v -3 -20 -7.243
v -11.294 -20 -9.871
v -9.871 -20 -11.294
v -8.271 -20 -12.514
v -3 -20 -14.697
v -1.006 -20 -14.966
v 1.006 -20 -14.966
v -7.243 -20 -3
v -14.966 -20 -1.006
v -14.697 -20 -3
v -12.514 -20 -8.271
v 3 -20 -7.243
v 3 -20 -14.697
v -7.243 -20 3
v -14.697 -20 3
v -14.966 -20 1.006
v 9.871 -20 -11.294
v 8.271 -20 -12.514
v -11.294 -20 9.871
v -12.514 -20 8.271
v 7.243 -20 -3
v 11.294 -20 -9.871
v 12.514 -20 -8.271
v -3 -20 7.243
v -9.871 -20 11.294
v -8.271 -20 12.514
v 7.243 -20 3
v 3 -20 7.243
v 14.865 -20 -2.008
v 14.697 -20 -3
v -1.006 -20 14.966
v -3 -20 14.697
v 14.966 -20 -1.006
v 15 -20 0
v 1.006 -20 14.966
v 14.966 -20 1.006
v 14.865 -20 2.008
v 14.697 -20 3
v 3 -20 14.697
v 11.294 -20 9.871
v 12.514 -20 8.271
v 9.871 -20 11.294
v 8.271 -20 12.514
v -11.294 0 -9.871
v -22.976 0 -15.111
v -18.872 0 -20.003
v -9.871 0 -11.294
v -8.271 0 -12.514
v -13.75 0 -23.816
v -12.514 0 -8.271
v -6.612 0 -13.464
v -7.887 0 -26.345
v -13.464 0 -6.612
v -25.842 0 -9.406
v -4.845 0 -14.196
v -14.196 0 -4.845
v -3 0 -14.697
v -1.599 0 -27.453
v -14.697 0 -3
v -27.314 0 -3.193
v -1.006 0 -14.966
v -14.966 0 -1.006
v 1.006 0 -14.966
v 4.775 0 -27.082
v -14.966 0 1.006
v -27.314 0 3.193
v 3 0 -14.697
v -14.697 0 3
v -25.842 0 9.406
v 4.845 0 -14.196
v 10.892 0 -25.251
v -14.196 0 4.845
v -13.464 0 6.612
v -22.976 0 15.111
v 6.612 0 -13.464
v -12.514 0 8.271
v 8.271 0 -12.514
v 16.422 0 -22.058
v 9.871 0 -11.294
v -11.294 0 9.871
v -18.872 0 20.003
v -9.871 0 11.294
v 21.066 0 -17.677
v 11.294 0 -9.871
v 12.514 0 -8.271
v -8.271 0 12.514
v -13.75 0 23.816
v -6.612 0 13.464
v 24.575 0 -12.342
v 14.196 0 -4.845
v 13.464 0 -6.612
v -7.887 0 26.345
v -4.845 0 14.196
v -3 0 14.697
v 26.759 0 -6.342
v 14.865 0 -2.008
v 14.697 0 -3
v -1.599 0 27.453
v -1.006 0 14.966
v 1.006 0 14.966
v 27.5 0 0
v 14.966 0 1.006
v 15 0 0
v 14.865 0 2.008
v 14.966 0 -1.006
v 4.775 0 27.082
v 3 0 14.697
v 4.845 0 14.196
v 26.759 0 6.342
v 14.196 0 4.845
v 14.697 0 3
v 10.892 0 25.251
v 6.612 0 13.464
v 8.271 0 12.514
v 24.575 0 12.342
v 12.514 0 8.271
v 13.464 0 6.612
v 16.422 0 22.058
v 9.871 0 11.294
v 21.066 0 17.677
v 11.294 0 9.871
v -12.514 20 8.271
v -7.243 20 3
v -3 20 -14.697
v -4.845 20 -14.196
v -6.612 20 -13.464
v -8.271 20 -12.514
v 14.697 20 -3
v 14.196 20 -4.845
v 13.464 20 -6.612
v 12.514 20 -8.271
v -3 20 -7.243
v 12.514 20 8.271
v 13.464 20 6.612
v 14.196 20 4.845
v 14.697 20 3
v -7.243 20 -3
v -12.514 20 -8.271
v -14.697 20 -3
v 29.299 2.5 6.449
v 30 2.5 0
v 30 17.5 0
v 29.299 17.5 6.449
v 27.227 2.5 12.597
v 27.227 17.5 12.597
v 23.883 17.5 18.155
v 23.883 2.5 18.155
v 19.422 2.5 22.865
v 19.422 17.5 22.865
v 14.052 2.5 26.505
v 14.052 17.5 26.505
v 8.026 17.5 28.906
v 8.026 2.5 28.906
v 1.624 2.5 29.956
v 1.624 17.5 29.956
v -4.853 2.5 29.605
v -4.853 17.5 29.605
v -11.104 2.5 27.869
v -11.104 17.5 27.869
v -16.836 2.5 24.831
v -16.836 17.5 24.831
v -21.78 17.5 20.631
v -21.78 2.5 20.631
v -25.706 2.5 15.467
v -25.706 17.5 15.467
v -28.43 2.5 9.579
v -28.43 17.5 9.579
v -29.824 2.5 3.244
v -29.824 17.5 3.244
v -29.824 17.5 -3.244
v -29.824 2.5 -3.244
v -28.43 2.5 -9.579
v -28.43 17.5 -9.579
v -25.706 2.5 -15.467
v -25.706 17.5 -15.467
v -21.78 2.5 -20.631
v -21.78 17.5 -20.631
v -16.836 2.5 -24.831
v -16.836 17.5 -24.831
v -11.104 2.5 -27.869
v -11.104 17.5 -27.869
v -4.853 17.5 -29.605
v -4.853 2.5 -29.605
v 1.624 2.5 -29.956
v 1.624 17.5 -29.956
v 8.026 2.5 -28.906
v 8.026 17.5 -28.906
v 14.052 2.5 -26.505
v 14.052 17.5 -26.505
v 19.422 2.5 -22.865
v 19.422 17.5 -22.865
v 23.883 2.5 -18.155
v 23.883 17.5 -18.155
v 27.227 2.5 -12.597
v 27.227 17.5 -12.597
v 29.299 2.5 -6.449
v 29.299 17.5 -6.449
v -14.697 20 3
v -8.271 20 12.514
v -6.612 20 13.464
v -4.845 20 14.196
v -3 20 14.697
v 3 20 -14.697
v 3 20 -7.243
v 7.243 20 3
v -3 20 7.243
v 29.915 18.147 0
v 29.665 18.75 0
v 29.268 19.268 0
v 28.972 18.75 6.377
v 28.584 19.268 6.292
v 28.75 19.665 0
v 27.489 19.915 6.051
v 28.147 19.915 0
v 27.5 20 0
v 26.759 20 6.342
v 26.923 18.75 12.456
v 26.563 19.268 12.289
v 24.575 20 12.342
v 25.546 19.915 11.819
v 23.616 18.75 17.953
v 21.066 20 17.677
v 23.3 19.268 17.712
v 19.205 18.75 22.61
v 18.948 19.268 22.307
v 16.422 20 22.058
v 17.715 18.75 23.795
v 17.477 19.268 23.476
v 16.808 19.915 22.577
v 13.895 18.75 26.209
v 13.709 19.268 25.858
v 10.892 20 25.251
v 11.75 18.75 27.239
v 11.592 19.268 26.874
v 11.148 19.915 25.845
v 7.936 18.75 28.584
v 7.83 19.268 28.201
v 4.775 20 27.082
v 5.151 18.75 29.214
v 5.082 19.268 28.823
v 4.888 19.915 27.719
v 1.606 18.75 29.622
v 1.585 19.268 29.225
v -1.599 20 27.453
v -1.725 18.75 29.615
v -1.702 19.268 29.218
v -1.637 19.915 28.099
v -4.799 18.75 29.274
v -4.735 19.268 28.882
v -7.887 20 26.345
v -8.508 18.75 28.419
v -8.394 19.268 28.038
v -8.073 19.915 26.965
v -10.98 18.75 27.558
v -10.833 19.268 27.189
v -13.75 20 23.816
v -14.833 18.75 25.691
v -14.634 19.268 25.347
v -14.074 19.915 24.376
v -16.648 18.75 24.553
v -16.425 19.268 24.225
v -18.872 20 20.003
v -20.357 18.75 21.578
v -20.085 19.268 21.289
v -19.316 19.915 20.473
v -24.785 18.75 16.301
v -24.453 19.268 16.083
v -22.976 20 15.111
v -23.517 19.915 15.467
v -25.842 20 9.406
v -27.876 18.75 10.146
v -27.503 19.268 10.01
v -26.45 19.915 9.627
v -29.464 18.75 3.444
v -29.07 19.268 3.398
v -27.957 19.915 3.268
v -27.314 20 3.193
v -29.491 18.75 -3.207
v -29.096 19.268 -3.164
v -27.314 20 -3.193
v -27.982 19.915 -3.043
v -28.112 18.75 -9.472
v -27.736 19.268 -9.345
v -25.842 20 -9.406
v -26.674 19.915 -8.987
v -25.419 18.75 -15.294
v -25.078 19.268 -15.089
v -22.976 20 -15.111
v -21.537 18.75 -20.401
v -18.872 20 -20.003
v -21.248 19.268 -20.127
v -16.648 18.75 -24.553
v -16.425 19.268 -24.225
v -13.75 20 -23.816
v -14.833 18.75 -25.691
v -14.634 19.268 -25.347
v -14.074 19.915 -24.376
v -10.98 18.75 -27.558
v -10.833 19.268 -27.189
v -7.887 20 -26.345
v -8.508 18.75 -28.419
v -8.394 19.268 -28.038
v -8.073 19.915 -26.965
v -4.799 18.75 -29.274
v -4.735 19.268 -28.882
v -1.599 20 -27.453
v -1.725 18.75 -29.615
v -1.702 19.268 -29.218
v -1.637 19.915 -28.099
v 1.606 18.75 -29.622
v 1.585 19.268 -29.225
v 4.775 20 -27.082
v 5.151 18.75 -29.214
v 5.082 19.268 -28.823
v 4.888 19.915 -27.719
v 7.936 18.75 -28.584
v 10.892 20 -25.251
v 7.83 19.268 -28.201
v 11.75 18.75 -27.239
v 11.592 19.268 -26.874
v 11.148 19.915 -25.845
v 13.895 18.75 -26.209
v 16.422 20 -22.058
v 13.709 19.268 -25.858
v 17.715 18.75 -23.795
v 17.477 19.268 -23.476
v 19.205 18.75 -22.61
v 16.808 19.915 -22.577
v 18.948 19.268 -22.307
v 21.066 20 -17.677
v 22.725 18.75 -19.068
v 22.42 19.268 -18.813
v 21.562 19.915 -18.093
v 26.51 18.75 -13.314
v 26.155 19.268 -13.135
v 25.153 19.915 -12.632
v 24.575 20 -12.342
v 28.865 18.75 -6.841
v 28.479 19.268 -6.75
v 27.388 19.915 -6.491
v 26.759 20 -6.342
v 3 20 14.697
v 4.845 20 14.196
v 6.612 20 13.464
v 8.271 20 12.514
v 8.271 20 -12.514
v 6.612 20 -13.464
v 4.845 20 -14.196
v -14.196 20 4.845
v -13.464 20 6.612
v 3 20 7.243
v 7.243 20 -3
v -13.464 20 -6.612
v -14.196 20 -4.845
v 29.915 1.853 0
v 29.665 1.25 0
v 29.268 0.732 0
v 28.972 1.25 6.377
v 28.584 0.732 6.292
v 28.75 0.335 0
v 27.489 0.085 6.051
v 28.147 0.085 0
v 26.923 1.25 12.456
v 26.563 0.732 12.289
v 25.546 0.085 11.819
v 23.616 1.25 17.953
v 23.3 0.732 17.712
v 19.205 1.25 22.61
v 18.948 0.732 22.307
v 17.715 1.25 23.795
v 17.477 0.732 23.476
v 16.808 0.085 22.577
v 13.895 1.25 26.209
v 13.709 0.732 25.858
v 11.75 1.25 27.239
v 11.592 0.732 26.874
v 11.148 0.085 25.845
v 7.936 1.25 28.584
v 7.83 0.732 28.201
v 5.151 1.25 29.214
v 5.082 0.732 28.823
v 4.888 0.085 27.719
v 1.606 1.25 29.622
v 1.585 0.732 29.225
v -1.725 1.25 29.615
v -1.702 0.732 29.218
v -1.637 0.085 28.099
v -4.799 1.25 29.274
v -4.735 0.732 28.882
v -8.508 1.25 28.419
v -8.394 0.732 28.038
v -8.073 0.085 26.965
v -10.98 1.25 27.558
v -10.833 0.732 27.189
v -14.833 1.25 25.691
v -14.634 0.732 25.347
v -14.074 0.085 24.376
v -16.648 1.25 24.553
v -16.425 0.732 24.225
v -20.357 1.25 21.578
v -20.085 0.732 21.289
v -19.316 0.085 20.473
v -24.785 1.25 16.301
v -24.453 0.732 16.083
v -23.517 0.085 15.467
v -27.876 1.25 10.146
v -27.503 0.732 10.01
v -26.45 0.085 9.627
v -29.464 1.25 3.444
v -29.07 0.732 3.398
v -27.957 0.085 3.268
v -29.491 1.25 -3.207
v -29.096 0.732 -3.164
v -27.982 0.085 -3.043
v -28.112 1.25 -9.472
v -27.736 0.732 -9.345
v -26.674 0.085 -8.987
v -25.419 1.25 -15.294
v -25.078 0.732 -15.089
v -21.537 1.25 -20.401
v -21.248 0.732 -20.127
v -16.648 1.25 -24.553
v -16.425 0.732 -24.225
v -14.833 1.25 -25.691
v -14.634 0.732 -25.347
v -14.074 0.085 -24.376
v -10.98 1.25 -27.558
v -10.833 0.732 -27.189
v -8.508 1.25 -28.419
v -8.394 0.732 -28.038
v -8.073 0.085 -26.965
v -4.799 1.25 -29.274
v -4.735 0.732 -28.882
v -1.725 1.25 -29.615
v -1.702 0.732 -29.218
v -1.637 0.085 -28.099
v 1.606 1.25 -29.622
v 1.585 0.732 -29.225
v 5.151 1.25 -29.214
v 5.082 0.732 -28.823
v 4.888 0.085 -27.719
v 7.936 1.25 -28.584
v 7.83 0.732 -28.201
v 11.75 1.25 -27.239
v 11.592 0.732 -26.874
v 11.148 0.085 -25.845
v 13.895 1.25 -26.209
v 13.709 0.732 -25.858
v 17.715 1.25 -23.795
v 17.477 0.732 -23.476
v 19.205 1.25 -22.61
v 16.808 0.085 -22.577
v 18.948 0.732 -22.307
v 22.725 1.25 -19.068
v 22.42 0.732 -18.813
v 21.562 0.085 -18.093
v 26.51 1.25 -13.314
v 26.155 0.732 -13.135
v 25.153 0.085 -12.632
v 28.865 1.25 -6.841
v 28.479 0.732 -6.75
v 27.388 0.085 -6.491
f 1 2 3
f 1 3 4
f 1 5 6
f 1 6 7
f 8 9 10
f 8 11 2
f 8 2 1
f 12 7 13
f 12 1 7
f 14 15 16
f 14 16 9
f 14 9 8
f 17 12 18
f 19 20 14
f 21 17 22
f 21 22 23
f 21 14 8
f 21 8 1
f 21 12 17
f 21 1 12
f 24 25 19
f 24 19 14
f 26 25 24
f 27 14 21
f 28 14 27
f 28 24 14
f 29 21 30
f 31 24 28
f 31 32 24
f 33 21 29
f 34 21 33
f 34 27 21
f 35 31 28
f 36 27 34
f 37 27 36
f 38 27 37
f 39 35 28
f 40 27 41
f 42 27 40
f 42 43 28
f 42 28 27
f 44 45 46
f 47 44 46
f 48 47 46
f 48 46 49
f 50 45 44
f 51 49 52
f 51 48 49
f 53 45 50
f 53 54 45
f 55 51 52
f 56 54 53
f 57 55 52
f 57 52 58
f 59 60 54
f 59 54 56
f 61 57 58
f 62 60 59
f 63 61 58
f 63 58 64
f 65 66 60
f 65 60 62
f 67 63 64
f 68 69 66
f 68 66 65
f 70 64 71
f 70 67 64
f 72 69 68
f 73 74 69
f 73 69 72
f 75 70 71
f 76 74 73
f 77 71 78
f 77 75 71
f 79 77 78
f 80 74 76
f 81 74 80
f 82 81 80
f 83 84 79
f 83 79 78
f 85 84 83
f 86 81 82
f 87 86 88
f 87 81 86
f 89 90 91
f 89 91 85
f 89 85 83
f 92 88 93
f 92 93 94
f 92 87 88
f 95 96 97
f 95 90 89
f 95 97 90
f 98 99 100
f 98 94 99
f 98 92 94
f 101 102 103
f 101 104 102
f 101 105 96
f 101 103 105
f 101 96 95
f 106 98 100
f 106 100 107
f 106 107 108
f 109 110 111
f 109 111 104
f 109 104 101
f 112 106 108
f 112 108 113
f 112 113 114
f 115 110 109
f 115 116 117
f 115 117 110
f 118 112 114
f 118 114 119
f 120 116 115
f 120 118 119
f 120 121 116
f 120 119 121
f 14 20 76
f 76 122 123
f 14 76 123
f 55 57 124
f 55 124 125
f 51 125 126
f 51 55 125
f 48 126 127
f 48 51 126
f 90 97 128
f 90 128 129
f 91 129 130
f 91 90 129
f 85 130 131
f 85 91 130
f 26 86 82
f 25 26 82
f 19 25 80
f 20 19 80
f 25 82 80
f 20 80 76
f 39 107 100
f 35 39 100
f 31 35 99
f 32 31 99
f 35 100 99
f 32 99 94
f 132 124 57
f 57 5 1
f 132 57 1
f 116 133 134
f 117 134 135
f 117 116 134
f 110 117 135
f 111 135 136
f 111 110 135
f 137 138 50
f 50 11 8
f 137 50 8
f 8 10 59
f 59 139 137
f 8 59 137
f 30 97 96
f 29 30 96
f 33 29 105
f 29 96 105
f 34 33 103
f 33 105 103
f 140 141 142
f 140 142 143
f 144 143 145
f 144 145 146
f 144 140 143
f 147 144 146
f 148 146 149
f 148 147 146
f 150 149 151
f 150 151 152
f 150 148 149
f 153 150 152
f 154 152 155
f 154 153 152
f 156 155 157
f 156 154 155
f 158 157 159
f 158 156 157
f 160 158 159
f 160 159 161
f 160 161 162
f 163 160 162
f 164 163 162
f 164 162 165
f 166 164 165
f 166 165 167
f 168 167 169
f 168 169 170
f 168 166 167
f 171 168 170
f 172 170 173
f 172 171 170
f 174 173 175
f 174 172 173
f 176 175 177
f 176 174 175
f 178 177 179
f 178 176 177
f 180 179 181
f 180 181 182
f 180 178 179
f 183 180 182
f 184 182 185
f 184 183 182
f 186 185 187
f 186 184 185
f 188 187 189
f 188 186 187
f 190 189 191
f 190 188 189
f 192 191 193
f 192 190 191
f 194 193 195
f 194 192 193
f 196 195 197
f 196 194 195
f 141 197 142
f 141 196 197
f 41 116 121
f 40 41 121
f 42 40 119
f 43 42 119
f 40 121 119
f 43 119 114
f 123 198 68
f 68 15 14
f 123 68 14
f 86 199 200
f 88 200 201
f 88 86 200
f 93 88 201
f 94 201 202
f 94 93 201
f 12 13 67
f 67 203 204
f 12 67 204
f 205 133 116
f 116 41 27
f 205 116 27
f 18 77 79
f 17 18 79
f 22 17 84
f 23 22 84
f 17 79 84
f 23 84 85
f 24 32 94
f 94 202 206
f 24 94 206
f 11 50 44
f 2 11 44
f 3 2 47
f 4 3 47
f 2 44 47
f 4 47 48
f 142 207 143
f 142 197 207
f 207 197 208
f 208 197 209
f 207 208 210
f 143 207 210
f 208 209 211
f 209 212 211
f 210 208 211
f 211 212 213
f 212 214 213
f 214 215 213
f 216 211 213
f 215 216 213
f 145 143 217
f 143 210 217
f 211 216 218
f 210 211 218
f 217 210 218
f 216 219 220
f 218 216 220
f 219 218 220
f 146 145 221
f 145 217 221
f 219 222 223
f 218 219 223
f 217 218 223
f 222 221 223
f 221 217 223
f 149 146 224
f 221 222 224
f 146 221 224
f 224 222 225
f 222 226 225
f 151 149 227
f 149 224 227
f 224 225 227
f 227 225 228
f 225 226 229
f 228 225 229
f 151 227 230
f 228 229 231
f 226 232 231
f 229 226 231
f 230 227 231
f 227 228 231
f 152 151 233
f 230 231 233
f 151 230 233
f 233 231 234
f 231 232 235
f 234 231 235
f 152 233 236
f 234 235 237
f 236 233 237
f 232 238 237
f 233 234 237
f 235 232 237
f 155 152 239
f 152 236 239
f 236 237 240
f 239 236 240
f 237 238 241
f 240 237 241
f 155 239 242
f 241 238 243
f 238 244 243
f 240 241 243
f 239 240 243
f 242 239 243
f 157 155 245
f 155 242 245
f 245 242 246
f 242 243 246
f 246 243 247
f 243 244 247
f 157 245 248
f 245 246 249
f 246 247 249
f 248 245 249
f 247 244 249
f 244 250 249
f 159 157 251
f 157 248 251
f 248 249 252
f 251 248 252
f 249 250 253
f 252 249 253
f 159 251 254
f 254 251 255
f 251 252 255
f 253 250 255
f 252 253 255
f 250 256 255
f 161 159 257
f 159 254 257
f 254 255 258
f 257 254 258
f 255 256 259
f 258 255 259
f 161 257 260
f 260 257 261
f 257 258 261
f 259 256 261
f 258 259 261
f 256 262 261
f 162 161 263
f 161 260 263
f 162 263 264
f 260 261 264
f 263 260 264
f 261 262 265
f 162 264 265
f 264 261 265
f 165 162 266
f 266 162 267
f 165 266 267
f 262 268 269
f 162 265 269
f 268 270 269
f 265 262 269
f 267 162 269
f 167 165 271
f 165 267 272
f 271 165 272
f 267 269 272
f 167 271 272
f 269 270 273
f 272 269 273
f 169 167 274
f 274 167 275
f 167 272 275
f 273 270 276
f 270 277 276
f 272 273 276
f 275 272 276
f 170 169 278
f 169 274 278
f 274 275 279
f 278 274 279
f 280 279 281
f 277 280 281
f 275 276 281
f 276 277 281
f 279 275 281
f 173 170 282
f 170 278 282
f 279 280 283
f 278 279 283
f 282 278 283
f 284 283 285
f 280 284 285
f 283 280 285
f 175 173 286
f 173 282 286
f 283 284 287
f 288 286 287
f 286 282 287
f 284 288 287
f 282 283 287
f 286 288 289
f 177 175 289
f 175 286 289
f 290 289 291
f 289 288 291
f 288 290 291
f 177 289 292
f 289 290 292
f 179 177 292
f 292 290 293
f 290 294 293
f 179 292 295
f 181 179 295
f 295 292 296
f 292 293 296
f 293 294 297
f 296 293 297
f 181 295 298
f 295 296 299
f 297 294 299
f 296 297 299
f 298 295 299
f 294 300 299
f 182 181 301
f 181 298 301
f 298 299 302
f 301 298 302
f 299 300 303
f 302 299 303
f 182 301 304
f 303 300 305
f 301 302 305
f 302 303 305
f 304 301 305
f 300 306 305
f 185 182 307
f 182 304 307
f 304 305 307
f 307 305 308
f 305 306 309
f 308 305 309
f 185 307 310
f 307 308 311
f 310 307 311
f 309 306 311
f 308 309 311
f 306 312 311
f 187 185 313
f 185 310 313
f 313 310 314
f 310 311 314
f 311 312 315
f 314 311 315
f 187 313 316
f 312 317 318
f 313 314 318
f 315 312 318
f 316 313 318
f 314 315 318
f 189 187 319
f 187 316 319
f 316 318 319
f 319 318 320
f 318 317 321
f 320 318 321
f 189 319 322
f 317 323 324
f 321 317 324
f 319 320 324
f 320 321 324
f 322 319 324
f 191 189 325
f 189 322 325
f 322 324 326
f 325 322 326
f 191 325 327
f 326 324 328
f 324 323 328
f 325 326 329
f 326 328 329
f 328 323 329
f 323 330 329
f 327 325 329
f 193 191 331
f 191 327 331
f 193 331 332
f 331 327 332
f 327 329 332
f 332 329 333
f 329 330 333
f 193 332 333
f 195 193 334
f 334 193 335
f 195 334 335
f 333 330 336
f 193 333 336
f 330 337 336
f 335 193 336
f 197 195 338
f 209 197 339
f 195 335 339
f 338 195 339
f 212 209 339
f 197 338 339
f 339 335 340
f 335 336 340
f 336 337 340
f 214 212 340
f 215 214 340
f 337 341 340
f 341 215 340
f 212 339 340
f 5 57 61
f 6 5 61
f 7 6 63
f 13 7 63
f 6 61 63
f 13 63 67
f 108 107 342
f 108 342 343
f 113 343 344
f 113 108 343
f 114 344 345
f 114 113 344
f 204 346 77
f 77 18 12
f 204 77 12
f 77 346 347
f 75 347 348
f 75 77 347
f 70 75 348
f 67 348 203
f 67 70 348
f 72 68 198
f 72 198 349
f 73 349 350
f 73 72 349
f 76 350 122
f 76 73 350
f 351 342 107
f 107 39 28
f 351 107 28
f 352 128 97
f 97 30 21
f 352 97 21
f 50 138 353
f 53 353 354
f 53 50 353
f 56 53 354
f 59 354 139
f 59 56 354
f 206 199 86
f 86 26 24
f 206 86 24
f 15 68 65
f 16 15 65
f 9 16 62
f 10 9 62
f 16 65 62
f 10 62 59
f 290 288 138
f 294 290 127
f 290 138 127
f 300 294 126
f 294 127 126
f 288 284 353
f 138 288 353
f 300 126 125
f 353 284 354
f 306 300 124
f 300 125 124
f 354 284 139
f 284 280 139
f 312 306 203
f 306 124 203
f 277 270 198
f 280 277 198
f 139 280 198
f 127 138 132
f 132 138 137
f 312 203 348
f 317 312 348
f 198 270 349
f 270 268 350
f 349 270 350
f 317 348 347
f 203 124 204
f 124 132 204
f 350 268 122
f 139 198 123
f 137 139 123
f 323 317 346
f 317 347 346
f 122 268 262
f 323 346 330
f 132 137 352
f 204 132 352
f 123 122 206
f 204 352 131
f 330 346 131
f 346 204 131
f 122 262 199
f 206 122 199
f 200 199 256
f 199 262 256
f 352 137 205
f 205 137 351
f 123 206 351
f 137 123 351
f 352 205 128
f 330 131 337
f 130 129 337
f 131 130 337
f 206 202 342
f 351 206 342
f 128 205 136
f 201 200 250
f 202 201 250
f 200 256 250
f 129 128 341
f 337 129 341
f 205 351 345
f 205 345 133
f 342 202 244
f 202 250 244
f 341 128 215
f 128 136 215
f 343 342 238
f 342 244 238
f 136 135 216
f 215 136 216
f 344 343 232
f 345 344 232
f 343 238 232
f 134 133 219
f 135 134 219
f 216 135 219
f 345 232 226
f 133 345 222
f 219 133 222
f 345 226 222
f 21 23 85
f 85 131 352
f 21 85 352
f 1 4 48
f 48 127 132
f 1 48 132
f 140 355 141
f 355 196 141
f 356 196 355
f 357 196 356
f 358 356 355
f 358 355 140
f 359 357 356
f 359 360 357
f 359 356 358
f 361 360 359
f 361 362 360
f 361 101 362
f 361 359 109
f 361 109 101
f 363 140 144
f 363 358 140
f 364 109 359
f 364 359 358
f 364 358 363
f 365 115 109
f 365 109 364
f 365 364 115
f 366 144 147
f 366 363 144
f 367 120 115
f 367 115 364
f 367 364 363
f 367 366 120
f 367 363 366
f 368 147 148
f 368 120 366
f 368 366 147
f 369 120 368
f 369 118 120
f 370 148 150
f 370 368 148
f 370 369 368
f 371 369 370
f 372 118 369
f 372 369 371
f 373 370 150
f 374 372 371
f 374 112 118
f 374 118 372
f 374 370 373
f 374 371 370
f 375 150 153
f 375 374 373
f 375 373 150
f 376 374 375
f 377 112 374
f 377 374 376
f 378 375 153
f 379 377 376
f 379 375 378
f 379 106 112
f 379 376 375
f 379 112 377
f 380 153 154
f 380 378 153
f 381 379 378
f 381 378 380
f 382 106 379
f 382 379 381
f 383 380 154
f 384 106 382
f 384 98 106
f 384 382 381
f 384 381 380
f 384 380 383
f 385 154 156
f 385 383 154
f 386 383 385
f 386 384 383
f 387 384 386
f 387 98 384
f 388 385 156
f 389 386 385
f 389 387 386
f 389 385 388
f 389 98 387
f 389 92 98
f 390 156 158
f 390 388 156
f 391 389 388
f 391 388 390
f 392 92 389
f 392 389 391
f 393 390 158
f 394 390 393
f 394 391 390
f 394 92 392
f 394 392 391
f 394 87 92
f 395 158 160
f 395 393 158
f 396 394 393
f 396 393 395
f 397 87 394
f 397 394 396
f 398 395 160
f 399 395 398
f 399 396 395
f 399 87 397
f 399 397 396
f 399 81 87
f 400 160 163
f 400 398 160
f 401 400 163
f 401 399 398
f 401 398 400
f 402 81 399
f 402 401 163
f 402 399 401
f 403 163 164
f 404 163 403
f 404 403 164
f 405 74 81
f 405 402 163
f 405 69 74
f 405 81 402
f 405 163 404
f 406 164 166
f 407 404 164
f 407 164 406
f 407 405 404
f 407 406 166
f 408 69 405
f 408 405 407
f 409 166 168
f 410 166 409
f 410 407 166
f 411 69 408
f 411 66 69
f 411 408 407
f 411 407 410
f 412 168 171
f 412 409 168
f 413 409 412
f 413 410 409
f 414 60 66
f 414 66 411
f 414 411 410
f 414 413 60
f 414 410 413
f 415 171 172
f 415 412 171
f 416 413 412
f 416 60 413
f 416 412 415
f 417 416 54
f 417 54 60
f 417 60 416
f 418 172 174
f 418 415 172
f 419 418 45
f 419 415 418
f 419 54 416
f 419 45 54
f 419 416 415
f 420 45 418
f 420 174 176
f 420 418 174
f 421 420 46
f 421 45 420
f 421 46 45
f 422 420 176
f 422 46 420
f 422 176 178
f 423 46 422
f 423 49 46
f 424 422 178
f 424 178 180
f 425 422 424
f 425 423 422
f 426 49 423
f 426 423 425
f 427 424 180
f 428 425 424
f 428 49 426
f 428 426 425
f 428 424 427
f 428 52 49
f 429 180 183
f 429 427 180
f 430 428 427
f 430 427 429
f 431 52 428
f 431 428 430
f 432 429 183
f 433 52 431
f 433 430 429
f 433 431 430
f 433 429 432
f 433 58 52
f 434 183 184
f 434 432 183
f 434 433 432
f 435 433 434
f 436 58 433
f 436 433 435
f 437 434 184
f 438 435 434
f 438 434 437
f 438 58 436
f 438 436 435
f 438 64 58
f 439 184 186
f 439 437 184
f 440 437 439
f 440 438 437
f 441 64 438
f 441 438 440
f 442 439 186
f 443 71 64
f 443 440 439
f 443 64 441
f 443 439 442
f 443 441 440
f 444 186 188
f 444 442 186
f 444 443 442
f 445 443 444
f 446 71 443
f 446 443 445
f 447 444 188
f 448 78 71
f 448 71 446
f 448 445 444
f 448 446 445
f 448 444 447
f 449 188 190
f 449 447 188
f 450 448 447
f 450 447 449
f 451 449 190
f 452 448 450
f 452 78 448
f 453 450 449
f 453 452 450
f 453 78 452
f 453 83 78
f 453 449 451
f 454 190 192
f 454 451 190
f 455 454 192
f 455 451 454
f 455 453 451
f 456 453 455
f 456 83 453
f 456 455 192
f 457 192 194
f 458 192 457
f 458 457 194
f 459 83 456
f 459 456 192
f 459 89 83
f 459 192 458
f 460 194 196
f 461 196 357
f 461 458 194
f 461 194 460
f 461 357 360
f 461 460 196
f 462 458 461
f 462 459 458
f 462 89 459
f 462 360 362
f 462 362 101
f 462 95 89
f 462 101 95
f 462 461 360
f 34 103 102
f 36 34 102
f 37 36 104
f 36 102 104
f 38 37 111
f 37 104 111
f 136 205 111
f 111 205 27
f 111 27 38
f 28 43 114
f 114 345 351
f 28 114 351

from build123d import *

# Parameters (mm, degrees)
F1_DEPTH = 20
F0_R     = 30
F2_DEPTH = 20
F3_R     = 2.5


with BuildPart() as f1:
    # F0 (on Front) → F1 (new body)
    with BuildSketch(Plane.XZ):
        with BuildLine():
            ThreePointArc((14.6969384567, -3), (14.9240422951, -1.5076344301), (15, 0))
            ThreePointArc((15, 0), (14.9240422951, 1.5076344301), (14.6969384567, 3))
            Line((14.6969384567, 3), (7.2426406871, 3))
            Line((7.2426406871, 3), (12.513625189, 8.2709845019))
            ThreePointArc((12.513625189, 8.2709845019), (10.6066017178, 10.6066017178), (8.2709845019, 12.513625189))
            Line((8.2709845019, 12.513625189), (3, 7.2426406871))
            Line((3, 7.2426406871), (3, 14.6969384567))
            ThreePointArc((3, 14.6969384567), (0, 15), (-3, 14.6969384567))
            Line((-3, 14.6969384567), (-3, 7.2426406871))
            Line((-3, 7.2426406871), (-8.2709845019, 12.513625189))
            ThreePointArc((-8.2709845019, 12.513625189), (-10.6066017178, 10.6066017178), (-12.513625189, 8.2709845019))
            Line((-12.513625189, 8.2709845019), (-7.2426406871, 3))
            Line((-7.2426406871, 3), (-14.6969384567, 3))
            ThreePointArc((-14.6969384567, 3), (-15, 0), (-14.6969384567, -3))
            Line((-14.6969384567, -3), (-7.2426406871, -3))
            Line((-7.2426406871, -3), (-12.513625189, -8.2709845019))
            ThreePointArc((-12.513625189, -8.2709845019), (-10.6066017178, -10.6066017178), (-8.2709845019, -12.513625189))
            Line((-8.2709845019, -12.513625189), (-3, -7.2426406871))
            Line((-3, -7.2426406871), (-3, -14.6969384567))
            ThreePointArc((-3, -14.6969384567), (0, -15), (3, -14.6969384567))
            Line((3, -14.6969384567), (3, -7.2426406871))
            Line((3, -7.2426406871), (8.2709845019, -12.513625189))
            ThreePointArc((8.2709845019, -12.513625189), (10.6066017178, -10.6066017178), (12.513625189, -8.2709845019))
            Line((12.513625189, -8.2709845019), (7.2426406871, -3))
            Line((7.2426406871, -3), (14.6969384567, -3))
        make_face()
    extrude(amount=F1_DEPTH)

    # F0 (on Front) + F1_face (on face) → F2 (join)
    with BuildSketch(Plane.XZ):
        Circle(F0_R)
        with BuildLine():
            ThreePointArc((14.6969384567, 3), (14.9240422951, 1.5076344301), (15, 0))
            ThreePointArc((15, 0), (14.9240422951, -1.5076344301), (14.6969384567, -3))
            ThreePointArc((14.6969384567, -3), (13.8581929877, -5.7402514855), (12.513625189, -8.2709845019))
            ThreePointArc((12.513625189, -8.2709845019), (10.6066017178, -10.6066017178), (8.2709845019, -12.513625189))
            ThreePointArc((8.2709845019, -12.513625189), (5.7402514855, -13.8581929877), (3, -14.6969384567))
            ThreePointArc((3, -14.6969384567), (0, -15), (-3, -14.6969384567))
            ThreePointArc((-3, -14.6969384567), (-5.7402514855, -13.8581929877), (-8.2709845019, -12.513625189))
            ThreePointArc((-8.2709845019, -12.513625189), (-10.6066017178, -10.6066017178), (-12.513625189, -8.2709845019))
            ThreePointArc((-12.513625189, -8.2709845019), (-13.8581929877, -5.7402514855), (-14.6969384567, -3))
            ThreePointArc((-14.6969384567, -3), (-15, 0), (-14.6969384567, 3))
            ThreePointArc((-14.6969384567, 3), (-13.8581929877, 5.7402514855), (-12.513625189, 8.2709845019))
            ThreePointArc((-12.513625189, 8.2709845019), (-10.6066017178, 10.6066017178), (-8.2709845019, 12.513625189))
            ThreePointArc((-8.2709845019, 12.513625189), (-5.7402514855, 13.8581929877), (-3, 14.6969384567))
            ThreePointArc((-3, 14.6969384567), (0, 15), (3, 14.6969384567))
            ThreePointArc((3, 14.6969384567), (5.7402514855, 13.8581929877), (8.2709845019, 12.513625189))
            ThreePointArc((8.2709845019, 12.513625189), (10.6066017178, 10.6066017178), (12.513625189, 8.2709845019))
            ThreePointArc((12.513625189, 8.2709845019), (13.8581929877, 5.7402514855), (14.6969384567, 3))
        make_face(mode=Mode.SUBTRACT)
    with BuildSketch(Plane(origin=(0, 0, 0), x_dir=(1, 0, 0), z_dir=(0, 1, 0))):
        with BuildLine():
            Line((7.2426406871, 3), (12.513625189, 8.2709845019))
            ThreePointArc((12.513625189, 8.2709845019), (10.6066017178, 10.6066017178), (8.2709845019, 12.513625189))
            Line((8.2709845019, 12.513625189), (3, 7.2426406871))
            Line((3, 7.2426406871), (3, 14.6969384567))
            ThreePointArc((3, 14.6969384567), (0, 15), (-3, 14.6969384567))
            Line((-3, 14.6969384567), (-3, 7.2426406871))
            Line((-3, 7.2426406871), (-8.2709845019, 12.513625189))
            ThreePointArc((-8.2709845019, 12.513625189), (-10.6066017178, 10.6066017178), (-12.513625189, 8.2709845019))
            Line((-12.513625189, 8.2709845019), (-7.2426406871, 3))
            Line((-7.2426406871, 3), (-14.6969384567, 3))
            ThreePointArc((-14.6969384567, 3), (-15, 0), (-14.6969384567, -3))
            Line((-14.6969384567, -3), (-7.2426406871, -3))
            Line((-7.2426406871, -3), (-12.513625189, -8.2709845019))
            ThreePointArc((-12.513625189, -8.2709845019), (-10.6066017178, -10.6066017178), (-8.2709845019, -12.513625189))
            Line((-8.2709845019, -12.513625189), (-3, -7.2426406871))
            Line((-3, -7.2426406871), (-3, -14.6969384567))
            ThreePointArc((-3, -14.6969384567), (0, -15), (3, -14.6969384567))
            Line((3, -14.6969384567), (3, -7.2426406871))
            Line((3, -7.2426406871), (8.2709845019, -12.513625189))
            ThreePointArc((8.2709845019, -12.513625189), (10.6066017178, -10.6066017178), (12.513625189, -8.2709845019))
            Line((12.513625189, -8.2709845019), (7.2426406871, -3))
            Line((7.2426406871, -3), (14.6969384567, -3))
            ThreePointArc((14.6969384567, -3), (15, 0), (14.6969384567, 3))
            Line((14.6969384567, 3), (7.2426406871, 3))
        make_face()
    extrude(amount=-F2_DEPTH, dir=(0, -1, 0))

    # F3
    f3_edges = [f1.edges().sort_by_distance(p)[0] for p in [
        (-30, 0, 0),
        (-30, 20, 0),
    ]]
    fillet(f3_edges, radius=F3_R)


solid = f1.part
